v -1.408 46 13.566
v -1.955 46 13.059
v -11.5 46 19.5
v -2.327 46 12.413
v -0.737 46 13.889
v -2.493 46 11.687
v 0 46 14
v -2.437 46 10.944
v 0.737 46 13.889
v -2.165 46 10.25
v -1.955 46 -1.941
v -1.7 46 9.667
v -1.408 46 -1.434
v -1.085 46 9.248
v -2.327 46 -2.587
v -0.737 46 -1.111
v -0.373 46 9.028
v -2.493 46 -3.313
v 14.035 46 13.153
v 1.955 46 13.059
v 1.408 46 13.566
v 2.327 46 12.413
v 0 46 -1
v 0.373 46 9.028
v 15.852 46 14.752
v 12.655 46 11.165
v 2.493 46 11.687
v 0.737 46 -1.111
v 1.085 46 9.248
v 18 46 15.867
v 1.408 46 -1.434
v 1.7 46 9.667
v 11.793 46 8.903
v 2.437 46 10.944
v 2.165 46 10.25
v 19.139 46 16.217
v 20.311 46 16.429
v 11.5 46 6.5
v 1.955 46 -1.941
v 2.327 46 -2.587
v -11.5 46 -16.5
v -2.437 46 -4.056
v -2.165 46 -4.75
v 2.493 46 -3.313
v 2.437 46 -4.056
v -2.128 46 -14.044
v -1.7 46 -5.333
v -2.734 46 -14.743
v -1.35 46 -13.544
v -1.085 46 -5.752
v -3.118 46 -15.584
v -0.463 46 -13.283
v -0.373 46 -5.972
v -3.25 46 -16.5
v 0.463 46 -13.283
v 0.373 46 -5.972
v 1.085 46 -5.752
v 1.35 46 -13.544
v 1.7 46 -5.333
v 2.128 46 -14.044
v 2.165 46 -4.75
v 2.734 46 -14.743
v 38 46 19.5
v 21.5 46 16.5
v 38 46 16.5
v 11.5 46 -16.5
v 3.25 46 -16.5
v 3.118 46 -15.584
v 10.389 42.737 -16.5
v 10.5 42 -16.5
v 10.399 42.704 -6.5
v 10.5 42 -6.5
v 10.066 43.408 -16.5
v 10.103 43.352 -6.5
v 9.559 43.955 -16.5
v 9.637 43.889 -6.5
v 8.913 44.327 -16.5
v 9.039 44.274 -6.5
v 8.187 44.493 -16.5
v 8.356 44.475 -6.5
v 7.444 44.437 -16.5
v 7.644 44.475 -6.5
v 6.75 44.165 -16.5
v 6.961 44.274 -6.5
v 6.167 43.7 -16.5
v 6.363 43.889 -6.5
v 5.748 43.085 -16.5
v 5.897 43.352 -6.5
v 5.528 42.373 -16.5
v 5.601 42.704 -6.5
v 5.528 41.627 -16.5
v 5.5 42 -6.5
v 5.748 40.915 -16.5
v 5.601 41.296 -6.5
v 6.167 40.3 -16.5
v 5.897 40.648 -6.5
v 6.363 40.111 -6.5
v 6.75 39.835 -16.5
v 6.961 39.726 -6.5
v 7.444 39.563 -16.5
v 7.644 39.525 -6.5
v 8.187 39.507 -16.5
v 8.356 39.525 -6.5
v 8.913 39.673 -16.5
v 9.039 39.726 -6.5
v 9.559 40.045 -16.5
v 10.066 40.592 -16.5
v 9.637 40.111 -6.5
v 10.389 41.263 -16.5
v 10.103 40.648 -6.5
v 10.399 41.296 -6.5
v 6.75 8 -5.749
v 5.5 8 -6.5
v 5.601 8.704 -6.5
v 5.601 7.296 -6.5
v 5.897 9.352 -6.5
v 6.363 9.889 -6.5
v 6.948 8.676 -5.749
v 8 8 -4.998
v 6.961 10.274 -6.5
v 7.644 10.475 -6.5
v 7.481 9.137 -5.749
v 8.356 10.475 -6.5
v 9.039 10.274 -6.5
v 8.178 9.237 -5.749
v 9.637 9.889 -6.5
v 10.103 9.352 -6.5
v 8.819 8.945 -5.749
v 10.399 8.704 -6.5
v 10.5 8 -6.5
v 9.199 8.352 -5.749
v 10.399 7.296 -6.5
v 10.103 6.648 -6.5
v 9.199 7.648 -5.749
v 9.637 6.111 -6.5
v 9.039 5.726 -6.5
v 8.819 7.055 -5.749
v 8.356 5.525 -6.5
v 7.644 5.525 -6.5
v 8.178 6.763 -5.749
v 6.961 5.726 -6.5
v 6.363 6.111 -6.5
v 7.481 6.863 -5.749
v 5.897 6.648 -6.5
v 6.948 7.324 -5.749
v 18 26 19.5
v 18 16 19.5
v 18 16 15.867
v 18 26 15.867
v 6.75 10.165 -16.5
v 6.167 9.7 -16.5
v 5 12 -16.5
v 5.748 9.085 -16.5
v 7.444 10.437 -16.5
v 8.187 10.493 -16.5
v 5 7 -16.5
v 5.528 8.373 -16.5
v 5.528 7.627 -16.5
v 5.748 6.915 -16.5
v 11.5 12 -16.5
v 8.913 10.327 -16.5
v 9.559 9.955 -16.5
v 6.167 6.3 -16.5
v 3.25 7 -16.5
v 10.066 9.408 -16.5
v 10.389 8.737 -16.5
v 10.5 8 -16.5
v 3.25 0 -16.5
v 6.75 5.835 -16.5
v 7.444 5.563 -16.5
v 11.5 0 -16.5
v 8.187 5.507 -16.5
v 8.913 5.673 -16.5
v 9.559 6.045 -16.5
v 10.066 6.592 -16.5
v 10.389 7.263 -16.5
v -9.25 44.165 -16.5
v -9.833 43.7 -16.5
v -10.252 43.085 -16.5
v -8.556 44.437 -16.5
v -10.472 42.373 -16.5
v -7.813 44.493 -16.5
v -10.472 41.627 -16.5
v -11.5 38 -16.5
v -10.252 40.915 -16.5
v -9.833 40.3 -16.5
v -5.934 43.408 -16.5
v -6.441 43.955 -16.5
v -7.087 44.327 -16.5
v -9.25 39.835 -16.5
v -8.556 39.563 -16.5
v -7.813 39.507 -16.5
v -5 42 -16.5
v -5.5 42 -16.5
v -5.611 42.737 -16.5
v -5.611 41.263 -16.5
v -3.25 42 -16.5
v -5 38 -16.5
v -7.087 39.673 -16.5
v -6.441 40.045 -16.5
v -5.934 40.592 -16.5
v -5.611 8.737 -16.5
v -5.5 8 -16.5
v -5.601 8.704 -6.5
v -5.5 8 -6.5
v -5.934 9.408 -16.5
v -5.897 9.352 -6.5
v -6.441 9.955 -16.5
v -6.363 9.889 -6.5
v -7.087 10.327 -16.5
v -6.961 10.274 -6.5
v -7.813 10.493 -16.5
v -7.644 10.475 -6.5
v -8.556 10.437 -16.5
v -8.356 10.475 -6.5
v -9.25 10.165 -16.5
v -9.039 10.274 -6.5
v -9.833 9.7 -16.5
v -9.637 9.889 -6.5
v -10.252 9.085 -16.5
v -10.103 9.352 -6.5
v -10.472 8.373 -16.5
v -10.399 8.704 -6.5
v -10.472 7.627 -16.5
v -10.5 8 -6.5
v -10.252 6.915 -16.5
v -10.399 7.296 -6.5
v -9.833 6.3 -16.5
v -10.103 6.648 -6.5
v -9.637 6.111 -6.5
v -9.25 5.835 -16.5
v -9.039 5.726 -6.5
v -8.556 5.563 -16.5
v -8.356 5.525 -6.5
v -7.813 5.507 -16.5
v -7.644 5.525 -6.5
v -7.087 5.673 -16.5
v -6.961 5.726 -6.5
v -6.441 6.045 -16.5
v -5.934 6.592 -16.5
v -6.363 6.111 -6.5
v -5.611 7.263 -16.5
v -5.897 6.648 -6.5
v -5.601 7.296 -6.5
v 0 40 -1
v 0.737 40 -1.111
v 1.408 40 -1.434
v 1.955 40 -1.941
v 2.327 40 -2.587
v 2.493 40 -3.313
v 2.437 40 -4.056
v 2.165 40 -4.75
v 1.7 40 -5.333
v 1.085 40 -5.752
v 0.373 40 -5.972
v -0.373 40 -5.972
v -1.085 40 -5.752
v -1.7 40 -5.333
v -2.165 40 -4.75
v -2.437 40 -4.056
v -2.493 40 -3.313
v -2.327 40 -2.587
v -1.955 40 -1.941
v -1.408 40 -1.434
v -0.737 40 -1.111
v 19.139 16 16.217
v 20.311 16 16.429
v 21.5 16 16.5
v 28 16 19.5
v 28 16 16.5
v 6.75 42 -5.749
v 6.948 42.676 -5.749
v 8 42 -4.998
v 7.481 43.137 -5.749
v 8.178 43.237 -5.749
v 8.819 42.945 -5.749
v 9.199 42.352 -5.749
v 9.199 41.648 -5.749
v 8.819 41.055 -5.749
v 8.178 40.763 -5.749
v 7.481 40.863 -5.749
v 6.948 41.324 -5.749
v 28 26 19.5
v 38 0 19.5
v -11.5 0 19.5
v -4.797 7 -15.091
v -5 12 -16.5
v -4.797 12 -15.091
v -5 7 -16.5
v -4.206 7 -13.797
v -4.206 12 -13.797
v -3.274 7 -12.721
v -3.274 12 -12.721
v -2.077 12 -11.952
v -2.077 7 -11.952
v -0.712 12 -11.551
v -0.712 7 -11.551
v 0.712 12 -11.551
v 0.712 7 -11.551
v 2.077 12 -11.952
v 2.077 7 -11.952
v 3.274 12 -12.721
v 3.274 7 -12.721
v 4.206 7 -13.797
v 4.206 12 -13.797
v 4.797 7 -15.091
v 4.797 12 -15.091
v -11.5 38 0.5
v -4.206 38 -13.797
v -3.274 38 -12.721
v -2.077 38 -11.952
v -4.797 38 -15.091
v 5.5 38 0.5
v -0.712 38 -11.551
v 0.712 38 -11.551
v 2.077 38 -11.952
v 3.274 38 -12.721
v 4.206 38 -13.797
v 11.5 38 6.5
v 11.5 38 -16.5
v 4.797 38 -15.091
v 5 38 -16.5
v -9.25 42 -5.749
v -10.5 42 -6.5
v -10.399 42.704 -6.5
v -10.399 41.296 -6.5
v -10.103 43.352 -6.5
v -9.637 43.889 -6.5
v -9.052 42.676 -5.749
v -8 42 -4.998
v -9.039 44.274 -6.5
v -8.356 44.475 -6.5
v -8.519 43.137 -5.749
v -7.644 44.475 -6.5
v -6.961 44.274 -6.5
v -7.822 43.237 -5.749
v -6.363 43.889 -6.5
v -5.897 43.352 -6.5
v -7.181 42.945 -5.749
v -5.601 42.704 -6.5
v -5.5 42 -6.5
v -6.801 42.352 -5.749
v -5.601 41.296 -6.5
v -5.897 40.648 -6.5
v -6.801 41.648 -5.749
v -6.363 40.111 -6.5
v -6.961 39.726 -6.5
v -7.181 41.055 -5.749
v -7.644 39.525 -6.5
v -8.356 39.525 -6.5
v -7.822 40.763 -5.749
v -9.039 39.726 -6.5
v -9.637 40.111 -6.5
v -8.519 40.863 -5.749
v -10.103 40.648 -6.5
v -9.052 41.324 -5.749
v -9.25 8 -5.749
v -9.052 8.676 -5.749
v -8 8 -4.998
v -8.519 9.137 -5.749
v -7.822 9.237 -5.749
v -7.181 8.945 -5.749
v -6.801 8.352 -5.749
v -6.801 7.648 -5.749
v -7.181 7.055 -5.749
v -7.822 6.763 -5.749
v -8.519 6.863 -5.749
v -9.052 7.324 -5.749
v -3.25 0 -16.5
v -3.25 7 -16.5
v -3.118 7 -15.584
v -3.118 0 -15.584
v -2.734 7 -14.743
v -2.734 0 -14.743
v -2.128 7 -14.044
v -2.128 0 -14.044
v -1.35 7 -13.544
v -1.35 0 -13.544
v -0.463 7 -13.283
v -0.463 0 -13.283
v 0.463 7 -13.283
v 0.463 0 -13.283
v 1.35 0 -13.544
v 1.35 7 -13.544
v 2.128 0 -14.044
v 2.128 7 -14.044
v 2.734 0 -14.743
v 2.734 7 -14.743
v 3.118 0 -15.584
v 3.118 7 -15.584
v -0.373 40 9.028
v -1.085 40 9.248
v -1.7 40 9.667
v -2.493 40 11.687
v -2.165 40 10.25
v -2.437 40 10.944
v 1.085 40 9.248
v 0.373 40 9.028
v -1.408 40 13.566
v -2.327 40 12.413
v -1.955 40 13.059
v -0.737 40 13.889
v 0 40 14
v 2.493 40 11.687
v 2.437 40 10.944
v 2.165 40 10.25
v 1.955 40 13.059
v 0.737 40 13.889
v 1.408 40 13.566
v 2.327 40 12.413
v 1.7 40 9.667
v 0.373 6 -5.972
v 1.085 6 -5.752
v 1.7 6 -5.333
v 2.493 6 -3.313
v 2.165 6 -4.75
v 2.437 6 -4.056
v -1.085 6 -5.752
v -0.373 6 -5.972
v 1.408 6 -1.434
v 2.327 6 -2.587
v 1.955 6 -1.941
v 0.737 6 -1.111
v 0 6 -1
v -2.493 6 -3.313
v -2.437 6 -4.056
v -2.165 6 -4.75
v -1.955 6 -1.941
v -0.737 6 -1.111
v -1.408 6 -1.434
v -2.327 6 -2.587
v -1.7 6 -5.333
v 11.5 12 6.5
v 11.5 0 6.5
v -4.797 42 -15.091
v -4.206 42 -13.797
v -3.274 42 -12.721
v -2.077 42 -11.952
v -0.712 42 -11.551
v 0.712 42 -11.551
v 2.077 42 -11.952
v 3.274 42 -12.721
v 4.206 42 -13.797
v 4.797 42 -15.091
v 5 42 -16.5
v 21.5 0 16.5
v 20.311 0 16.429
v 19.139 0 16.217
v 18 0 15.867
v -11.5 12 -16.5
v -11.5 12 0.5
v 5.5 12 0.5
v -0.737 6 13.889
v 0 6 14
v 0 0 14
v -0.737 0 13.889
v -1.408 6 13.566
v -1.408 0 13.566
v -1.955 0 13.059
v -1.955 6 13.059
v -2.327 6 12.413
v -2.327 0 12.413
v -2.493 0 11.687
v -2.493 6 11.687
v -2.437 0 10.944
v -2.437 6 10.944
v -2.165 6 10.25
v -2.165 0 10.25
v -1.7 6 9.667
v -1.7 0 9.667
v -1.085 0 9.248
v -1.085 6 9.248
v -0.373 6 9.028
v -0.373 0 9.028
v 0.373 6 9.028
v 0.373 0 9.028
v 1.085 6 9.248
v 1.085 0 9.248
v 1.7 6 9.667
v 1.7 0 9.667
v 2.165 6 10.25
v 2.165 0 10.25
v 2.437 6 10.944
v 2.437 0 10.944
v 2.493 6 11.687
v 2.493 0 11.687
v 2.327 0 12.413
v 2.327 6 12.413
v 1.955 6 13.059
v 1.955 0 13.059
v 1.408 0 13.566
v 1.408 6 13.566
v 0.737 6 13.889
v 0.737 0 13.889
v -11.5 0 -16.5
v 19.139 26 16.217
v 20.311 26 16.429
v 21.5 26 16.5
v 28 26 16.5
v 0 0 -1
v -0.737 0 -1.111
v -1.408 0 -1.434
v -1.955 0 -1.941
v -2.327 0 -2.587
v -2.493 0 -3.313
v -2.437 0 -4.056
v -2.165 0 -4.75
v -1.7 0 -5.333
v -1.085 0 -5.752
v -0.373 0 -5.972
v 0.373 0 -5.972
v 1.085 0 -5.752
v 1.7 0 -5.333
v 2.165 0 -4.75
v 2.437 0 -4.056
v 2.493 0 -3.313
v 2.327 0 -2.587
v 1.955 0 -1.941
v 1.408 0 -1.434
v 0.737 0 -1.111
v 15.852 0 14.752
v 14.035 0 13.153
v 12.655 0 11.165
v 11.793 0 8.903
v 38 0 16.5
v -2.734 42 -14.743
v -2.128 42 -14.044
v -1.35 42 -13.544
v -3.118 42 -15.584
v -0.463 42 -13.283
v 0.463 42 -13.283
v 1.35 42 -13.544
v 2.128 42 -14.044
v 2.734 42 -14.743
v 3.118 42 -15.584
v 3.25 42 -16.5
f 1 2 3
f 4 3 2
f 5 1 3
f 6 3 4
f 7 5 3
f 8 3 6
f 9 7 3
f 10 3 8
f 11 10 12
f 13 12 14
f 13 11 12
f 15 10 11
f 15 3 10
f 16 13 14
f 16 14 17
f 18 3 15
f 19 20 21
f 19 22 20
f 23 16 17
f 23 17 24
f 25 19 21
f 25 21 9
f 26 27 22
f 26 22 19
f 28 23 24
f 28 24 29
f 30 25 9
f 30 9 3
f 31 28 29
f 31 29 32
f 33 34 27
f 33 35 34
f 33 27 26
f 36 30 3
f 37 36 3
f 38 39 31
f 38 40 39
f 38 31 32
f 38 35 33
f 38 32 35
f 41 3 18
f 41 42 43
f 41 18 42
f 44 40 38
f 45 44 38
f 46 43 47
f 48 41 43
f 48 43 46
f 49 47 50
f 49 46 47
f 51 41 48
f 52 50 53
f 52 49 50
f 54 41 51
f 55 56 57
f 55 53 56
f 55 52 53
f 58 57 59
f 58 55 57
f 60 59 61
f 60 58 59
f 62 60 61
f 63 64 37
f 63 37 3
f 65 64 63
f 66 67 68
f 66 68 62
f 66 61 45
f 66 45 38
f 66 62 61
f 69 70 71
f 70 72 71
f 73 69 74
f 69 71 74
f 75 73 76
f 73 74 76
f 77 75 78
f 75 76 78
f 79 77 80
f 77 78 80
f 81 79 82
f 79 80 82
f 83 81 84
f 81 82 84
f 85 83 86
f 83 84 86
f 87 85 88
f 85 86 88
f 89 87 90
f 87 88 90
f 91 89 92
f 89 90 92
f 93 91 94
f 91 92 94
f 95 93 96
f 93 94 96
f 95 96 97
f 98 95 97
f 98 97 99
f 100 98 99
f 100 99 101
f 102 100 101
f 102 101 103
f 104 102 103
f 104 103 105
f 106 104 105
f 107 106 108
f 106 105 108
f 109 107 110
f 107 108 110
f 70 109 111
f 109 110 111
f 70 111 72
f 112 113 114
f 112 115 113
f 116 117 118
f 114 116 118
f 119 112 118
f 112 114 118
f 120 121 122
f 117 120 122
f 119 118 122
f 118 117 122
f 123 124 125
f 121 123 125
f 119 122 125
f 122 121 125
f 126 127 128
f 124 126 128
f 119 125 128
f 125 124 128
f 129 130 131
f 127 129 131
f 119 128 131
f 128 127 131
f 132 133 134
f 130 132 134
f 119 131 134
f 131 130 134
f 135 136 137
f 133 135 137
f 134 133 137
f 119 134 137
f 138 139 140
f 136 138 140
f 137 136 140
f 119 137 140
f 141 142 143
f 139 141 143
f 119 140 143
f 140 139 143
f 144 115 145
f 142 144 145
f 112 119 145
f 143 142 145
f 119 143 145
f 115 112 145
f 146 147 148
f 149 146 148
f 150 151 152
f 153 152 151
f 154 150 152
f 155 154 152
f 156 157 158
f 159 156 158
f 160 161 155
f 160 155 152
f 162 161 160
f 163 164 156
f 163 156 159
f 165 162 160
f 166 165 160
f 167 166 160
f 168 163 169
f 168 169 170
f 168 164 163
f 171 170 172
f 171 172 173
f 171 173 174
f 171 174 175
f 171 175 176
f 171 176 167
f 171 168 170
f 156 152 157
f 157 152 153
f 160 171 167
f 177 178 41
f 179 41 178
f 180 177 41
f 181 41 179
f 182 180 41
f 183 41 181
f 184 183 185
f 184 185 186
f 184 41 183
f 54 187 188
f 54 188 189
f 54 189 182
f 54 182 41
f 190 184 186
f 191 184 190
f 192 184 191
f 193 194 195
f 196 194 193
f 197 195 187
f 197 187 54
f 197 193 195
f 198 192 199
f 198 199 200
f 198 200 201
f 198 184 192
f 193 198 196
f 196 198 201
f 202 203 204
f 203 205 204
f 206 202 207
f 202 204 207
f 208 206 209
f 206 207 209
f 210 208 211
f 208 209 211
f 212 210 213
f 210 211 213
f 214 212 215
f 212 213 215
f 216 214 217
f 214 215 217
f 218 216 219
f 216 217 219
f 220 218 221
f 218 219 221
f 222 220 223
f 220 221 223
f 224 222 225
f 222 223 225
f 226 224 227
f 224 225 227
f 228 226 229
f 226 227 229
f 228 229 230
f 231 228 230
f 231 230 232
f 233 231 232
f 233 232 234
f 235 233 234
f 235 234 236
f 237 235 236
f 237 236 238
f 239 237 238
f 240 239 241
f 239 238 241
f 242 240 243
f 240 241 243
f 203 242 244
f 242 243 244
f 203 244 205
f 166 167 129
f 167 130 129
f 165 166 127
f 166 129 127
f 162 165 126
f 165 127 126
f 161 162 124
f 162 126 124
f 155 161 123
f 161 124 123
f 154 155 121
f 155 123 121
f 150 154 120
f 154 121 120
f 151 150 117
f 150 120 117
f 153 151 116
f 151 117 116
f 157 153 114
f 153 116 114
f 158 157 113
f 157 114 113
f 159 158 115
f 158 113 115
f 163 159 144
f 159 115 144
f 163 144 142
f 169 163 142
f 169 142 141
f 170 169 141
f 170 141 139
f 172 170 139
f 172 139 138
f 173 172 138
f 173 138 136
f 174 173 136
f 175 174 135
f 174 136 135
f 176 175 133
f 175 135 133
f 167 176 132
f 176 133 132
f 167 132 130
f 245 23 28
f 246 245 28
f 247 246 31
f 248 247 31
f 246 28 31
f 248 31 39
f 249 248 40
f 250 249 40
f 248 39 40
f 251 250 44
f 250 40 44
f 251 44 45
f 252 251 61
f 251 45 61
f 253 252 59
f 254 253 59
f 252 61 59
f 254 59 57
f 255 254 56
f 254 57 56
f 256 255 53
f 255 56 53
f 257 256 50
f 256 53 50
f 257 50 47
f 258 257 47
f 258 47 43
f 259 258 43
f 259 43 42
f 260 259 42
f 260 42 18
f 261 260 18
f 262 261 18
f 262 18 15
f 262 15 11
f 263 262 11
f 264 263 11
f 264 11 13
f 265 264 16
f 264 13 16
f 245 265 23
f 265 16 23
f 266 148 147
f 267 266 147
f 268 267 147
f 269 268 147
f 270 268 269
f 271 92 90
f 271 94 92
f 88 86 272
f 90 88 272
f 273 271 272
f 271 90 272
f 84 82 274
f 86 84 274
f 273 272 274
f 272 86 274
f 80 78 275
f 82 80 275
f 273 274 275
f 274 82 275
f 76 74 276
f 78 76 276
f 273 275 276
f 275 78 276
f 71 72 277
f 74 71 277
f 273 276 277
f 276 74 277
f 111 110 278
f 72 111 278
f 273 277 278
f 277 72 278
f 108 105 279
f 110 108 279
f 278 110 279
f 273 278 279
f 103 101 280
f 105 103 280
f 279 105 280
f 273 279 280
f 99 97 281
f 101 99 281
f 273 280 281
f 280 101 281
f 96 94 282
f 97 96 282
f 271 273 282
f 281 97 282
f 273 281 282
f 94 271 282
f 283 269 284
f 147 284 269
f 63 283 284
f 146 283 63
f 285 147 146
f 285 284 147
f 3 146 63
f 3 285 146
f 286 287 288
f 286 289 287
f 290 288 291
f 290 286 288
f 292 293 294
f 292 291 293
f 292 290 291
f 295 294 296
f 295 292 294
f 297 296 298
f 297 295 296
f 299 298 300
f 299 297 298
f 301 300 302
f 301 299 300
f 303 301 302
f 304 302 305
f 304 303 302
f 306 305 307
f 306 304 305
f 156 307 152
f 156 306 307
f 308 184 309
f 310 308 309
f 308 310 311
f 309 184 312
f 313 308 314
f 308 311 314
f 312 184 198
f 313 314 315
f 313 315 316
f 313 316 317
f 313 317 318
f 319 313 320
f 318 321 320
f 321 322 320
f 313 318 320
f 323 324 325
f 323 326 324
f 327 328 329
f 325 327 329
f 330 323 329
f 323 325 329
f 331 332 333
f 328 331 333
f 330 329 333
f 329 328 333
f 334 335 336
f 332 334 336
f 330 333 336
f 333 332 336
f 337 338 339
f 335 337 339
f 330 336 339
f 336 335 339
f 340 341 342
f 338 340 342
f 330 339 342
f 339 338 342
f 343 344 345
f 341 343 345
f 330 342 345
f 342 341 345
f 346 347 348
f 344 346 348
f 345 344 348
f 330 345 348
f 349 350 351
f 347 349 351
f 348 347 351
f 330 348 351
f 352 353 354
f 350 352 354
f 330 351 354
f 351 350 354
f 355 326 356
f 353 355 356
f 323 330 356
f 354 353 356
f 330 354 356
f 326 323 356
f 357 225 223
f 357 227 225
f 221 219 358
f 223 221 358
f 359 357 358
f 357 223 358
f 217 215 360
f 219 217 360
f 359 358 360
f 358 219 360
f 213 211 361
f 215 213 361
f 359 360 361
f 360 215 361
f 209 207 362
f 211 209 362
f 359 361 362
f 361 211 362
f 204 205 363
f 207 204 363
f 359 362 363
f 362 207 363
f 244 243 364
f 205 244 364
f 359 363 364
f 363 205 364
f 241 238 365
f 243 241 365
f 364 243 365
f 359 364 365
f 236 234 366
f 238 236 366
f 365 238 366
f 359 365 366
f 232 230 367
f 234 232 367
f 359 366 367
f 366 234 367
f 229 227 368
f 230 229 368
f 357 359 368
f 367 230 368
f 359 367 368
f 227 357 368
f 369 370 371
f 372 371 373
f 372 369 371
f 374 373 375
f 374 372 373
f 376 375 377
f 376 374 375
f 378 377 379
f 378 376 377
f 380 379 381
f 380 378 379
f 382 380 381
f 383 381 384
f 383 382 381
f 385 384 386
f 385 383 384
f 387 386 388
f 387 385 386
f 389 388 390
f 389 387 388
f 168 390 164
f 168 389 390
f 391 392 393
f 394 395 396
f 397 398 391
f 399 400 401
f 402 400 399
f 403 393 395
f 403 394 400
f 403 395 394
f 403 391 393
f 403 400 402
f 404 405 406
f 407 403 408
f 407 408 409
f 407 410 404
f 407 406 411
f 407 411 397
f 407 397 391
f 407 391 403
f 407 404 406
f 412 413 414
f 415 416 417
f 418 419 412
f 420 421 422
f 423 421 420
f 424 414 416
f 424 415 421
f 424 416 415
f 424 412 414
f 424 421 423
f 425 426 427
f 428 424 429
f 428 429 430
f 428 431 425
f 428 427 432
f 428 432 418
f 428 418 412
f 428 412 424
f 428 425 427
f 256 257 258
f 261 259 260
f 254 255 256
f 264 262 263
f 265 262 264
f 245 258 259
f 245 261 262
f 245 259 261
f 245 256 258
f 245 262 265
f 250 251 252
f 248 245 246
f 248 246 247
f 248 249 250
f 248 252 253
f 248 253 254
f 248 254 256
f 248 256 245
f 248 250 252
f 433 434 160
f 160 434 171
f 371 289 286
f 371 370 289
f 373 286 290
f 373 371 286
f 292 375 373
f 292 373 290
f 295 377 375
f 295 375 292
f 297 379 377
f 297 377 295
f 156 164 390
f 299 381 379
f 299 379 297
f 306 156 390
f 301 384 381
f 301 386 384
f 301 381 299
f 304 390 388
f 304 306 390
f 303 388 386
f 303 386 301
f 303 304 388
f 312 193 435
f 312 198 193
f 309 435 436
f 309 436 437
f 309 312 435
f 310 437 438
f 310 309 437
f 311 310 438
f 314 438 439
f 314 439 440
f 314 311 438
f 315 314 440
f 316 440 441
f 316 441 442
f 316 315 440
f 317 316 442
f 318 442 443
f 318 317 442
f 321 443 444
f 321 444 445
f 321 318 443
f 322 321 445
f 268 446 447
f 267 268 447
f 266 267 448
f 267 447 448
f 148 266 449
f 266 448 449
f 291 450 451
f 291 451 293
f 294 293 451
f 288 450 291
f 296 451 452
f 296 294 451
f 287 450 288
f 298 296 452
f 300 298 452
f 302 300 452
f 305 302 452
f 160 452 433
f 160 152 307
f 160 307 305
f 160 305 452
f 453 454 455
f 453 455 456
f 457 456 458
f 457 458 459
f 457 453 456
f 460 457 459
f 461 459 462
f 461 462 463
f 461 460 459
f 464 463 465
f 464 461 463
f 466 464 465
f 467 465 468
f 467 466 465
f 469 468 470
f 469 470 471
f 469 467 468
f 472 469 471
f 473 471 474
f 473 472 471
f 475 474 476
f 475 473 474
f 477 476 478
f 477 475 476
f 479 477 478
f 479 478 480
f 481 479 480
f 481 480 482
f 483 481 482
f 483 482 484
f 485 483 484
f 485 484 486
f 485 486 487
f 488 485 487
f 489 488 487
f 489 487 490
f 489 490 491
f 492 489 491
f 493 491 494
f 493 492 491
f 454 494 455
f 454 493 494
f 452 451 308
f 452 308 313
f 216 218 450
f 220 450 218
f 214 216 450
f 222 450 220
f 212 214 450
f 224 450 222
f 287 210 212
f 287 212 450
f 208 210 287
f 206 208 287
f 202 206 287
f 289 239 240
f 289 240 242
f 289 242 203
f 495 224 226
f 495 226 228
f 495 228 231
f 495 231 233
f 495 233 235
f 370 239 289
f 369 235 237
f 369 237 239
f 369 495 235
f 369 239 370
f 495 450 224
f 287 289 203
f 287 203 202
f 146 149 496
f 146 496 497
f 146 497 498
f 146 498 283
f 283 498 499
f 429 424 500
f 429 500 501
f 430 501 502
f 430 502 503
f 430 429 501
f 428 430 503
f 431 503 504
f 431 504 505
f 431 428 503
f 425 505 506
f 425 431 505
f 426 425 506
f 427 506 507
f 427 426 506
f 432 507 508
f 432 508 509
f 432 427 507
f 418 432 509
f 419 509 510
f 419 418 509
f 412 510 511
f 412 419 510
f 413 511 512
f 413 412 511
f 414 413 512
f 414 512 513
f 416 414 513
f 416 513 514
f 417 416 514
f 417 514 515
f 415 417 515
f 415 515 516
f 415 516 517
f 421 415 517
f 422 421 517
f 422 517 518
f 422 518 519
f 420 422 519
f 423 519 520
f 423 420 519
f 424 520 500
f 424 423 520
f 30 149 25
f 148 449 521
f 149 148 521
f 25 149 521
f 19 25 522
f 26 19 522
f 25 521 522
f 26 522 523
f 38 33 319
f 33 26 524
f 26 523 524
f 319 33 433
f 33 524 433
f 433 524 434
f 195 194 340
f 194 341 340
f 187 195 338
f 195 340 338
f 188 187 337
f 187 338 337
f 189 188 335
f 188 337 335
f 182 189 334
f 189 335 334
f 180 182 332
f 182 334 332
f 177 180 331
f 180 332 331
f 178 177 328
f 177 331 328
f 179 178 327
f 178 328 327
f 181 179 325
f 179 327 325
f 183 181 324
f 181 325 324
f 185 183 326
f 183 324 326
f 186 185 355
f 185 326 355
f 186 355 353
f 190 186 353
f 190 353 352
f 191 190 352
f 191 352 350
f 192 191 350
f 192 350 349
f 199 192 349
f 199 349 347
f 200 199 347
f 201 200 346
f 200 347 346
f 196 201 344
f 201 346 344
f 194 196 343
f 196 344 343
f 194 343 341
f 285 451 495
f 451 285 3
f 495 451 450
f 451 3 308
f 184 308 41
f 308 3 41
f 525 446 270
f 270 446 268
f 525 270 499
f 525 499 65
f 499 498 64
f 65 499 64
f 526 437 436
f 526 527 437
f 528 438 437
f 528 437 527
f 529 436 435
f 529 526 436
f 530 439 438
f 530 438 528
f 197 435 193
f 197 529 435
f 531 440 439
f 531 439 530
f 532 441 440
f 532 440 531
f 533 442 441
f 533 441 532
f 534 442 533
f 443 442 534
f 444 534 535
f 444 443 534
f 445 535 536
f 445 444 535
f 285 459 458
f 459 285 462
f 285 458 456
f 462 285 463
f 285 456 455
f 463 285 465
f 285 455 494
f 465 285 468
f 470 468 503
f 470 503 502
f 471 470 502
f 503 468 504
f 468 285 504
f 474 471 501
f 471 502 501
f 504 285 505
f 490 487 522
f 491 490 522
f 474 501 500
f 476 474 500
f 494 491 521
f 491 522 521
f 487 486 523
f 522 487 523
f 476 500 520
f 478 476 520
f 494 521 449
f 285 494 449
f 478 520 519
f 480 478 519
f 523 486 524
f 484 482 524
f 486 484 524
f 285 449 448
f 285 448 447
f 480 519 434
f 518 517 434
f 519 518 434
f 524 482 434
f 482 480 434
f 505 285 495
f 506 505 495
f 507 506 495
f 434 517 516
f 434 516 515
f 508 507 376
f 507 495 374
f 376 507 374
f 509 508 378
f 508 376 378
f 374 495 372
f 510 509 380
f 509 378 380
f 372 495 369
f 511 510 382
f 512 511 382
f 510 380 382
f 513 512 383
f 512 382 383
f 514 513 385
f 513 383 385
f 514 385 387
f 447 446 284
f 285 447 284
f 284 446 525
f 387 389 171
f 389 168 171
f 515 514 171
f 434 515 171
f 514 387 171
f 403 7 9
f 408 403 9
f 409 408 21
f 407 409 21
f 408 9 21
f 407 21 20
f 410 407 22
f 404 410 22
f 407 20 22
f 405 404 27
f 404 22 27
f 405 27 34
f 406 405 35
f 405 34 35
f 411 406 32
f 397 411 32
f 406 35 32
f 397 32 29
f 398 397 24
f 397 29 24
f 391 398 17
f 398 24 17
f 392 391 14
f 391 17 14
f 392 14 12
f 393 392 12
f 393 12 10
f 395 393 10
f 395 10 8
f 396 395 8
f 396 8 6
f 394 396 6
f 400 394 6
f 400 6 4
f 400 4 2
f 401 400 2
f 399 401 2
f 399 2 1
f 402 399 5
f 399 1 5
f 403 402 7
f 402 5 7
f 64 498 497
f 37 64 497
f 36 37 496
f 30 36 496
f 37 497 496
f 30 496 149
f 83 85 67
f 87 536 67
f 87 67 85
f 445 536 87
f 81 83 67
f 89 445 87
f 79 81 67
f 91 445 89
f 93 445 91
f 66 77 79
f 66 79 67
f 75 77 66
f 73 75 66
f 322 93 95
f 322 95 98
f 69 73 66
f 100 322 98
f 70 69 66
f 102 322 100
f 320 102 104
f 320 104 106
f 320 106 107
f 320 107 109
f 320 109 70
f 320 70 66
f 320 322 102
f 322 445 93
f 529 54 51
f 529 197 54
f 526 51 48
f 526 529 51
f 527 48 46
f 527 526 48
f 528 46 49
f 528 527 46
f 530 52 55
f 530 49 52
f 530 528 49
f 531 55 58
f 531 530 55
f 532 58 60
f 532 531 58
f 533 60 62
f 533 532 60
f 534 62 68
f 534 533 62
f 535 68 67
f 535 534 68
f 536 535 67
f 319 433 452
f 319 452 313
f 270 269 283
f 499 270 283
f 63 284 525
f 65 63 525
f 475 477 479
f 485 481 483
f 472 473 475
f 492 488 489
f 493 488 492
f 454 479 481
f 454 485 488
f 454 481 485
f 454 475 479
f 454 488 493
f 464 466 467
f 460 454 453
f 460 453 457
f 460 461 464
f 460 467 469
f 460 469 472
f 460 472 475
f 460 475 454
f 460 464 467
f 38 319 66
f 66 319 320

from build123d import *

# Parameters (mm, degrees)
SKETCH1_W                 = 23
SKETCH1_H                 = 33
BOSS_EXTRUDE1_DEPTH       = 46
CUT_EXTRUDE1_START        = 12
SKETCH2_W                 = 23
SKETCH2_H                 = 17
CUT_EXTRUDE1_DEPTH        = 26
SKETCH3_R                 = 2.5
CUT_EXTRUDE2_DEPTH        = 6
CUT_EXTRUDE3_START        = -6
SKETCH4_R                 = 2.5
CUT_EXTRUDE3_DEPTH        = 6
CHAMFER1_SIZE             = 6
BOSS_EXTRUDE2_DEPTH       = 26.5
BOSS_EXTRUDE2_DEPTH_BACK  = 23
SKETCH6_W                 = 3
SKETCH6_H                 = 46
F_5_0MM_DOWEL_HOLE1_D     = 5
F_5_0MM_DOWEL_HOLE1_DEPTH = 10
F_5_0MM_DOWEL_HOLE1_TIP   = 1.502151548
SKETCH14_W                = 10
SKETCH14_H                = 10
CUT_EXTRUDE4_DEPTH        = 70.685005561
FILLET1_DEPTH             = 46
FILLET1_START             = 26
FILLET1_2_DEPTH           = 20
FILLET1_3_DEPTH           = 16


with BuildPart() as part:
    # Sketch1 → Boss-Extrude1 (new body)
    with BuildSketch(Plane(origin=(0, 0, 0), x_dir=(1, 0, 0), z_dir=(0, 1, 0))):
        Rectangle(SKETCH1_W, SKETCH1_H)
    extrude(amount=BOSS_EXTRUDE1_DEPTH)

    # Sketch2 → Cut-Extrude1 (cut)
    with BuildSketch(Plane(origin=(0, 0, 0), x_dir=(1, 0, 0), z_dir=(0, 1, 0)).offset(CUT_EXTRUDE1_START)):
        with Locations((0, 8)):
            Rectangle(SKETCH2_W, SKETCH2_H)
    extrude(amount=CUT_EXTRUDE1_DEPTH, mode=Mode.SUBTRACT)

    # Sketch3 → Cut-Extrude2 (cut)
    with BuildSketch(Plane(origin=(0, 46, 0), x_dir=(1, 0, 0), z_dir=(0, 1, 0))):
        with Locations(Location((0, -11.5, 0), (0, 0, 270))):
            Circle(SKETCH3_R)
        with Locations(Location((0, 3.5, 0), (0, 0, 270))):
            Circle(SKETCH3_R)
    extrude(amount=-CUT_EXTRUDE2_DEPTH, mode=Mode.SUBTRACT)

    # Sketch4 → Cut-Extrude3 (cut)
    with BuildSketch(Plane.XZ.offset(CUT_EXTRUDE3_START)):
        with Locations(Location((0, -3.5, 0), (0, 0, 90))):
            Circle(SKETCH4_R)
        with Locations(Location((0, 11.5, 0), (0, 0, 90))):
            Circle(SKETCH4_R)
    extrude(amount=CUT_EXTRUDE3_DEPTH, mode=Mode.SUBTRACT)

    # Chamfer1
    chamfer1_edges = [part.edges().sort_by_distance(p)[0] for p in [
        (11.5, 25, 0.5),
    ]]
    chamfer(chamfer1_edges, length=CHAMFER1_SIZE)

    # Sketch6 → Boss-Extrude2 (add, two sides: drawn at the far end of the back side and taken through both)
    with BuildSketch(Plane(origin=(11.5, 0, 0), x_dir=(0, 0, -1), z_dir=(1, 0, 0)).offset(-BOSS_EXTRUDE2_DEPTH_BACK)):
        with Locations((-18, 23)):
            Rectangle(SKETCH6_W, SKETCH6_H)
    extrude(amount=BOSS_EXTRUDE2_DEPTH + BOSS_EXTRUDE2_DEPTH_BACK)

    # Ø5.0mm Dowel Hole1
    with Locations(Plane(origin=(0, 0, -16.5), x_dir=(-1, 0, 0), z_dir=(0, 0, -1))):
        with Locations((-8, 42), (-8, 8), (8, 8), (8, 42)):
            Hole(F_5_0MM_DOWEL_HOLE1_D / 2, depth=F_5_0MM_DOWEL_HOLE1_DEPTH)
            with Locations((0, 0, -(F_5_0MM_DOWEL_HOLE1_DEPTH + F_5_0MM_DOWEL_HOLE1_TIP / 2))):  # 118° drill point
                Cone(0, F_5_0MM_DOWEL_HOLE1_D / 2, F_5_0MM_DOWEL_HOLE1_TIP, mode=Mode.SUBTRACT)

    # Sketch14 → Cut-Extrude4 (cut, through all)
    with BuildSketch(Plane.XY.offset(19.5)):
        with Locations((23, 21)):
            Rectangle(SKETCH14_W, SKETCH14_H)
    extrude(amount=-CUT_EXTRUDE4_DEPTH, mode=Mode.SUBTRACT)

    # Sketch15 → Cut-Revolve1 (revolve, cut)
    with BuildSketch(Plane(origin=(0, 0, 0), x_dir=(0, 0, -1), z_dir=(1, 0, 0))):
        Polygon((16.5, 46), (13.25, 46), (13.25, 41.999935081), (11.5, 41.999935081), (11.5, 7), (13.25, 7), (13.25, 0), (16.5, 0), align=None)
    revolve(axis=Axis((0, 0, -16.5), (0, 1, 0)), mode=Mode.SUBTRACT)

    # Fillet1: read off the stored shape, not the designer's step
    # Fillet1 outline → Fillet1 (add)
    with BuildSketch(Plane(origin=(0, 0, 0), x_dir=(1, 0, 0), z_dir=(0, 1, 0))):
        with BuildLine():
            Line((18, -16.5), (18, -15.867496998))
            ThreePointArc((18, -15.867496998), (13.284161637, -12.200877126), (11.5, -6.5))
            Line((11.5, -6.5), (11.5, -16.5))
            Line((11.5, -16.5), (18, -16.5))
        make_face()
    extrude(amount=FILLET1_DEPTH)

    # Fillet1 2 outline → Fillet1 2 (add)
    with BuildSketch(Plane(origin=(0, 0, 0), x_dir=(1, 0, 0), z_dir=(0, 1, 0)).offset(FILLET1_START)):
        with BuildLine():
            ThreePointArc((21.5, -16.5), (19.721653855, -16.340603894), (18, -15.867496998))
            Line((18, -15.867496998), (18, -16.5))
            Line((18, -16.5), (21.5, -16.5))
        make_face()
    extrude(amount=FILLET1_2_DEPTH)

    # Fillet1 3 outline → Fillet1 3 (add)
    with BuildSketch(Plane(origin=(0, 0, 0), x_dir=(1, 0, 0), z_dir=(0, 1, 0))):
        with BuildLine():
            ThreePointArc((21.5, -16.5), (19.721653855, -16.340603894), (18, -15.867496998))
            Line((18, -15.867496998), (18, -16.5))
            Line((18, -16.5), (21.5, -16.5))
        make_face()
    extrude(amount=FILLET1_3_DEPTH)


solid = part.part
